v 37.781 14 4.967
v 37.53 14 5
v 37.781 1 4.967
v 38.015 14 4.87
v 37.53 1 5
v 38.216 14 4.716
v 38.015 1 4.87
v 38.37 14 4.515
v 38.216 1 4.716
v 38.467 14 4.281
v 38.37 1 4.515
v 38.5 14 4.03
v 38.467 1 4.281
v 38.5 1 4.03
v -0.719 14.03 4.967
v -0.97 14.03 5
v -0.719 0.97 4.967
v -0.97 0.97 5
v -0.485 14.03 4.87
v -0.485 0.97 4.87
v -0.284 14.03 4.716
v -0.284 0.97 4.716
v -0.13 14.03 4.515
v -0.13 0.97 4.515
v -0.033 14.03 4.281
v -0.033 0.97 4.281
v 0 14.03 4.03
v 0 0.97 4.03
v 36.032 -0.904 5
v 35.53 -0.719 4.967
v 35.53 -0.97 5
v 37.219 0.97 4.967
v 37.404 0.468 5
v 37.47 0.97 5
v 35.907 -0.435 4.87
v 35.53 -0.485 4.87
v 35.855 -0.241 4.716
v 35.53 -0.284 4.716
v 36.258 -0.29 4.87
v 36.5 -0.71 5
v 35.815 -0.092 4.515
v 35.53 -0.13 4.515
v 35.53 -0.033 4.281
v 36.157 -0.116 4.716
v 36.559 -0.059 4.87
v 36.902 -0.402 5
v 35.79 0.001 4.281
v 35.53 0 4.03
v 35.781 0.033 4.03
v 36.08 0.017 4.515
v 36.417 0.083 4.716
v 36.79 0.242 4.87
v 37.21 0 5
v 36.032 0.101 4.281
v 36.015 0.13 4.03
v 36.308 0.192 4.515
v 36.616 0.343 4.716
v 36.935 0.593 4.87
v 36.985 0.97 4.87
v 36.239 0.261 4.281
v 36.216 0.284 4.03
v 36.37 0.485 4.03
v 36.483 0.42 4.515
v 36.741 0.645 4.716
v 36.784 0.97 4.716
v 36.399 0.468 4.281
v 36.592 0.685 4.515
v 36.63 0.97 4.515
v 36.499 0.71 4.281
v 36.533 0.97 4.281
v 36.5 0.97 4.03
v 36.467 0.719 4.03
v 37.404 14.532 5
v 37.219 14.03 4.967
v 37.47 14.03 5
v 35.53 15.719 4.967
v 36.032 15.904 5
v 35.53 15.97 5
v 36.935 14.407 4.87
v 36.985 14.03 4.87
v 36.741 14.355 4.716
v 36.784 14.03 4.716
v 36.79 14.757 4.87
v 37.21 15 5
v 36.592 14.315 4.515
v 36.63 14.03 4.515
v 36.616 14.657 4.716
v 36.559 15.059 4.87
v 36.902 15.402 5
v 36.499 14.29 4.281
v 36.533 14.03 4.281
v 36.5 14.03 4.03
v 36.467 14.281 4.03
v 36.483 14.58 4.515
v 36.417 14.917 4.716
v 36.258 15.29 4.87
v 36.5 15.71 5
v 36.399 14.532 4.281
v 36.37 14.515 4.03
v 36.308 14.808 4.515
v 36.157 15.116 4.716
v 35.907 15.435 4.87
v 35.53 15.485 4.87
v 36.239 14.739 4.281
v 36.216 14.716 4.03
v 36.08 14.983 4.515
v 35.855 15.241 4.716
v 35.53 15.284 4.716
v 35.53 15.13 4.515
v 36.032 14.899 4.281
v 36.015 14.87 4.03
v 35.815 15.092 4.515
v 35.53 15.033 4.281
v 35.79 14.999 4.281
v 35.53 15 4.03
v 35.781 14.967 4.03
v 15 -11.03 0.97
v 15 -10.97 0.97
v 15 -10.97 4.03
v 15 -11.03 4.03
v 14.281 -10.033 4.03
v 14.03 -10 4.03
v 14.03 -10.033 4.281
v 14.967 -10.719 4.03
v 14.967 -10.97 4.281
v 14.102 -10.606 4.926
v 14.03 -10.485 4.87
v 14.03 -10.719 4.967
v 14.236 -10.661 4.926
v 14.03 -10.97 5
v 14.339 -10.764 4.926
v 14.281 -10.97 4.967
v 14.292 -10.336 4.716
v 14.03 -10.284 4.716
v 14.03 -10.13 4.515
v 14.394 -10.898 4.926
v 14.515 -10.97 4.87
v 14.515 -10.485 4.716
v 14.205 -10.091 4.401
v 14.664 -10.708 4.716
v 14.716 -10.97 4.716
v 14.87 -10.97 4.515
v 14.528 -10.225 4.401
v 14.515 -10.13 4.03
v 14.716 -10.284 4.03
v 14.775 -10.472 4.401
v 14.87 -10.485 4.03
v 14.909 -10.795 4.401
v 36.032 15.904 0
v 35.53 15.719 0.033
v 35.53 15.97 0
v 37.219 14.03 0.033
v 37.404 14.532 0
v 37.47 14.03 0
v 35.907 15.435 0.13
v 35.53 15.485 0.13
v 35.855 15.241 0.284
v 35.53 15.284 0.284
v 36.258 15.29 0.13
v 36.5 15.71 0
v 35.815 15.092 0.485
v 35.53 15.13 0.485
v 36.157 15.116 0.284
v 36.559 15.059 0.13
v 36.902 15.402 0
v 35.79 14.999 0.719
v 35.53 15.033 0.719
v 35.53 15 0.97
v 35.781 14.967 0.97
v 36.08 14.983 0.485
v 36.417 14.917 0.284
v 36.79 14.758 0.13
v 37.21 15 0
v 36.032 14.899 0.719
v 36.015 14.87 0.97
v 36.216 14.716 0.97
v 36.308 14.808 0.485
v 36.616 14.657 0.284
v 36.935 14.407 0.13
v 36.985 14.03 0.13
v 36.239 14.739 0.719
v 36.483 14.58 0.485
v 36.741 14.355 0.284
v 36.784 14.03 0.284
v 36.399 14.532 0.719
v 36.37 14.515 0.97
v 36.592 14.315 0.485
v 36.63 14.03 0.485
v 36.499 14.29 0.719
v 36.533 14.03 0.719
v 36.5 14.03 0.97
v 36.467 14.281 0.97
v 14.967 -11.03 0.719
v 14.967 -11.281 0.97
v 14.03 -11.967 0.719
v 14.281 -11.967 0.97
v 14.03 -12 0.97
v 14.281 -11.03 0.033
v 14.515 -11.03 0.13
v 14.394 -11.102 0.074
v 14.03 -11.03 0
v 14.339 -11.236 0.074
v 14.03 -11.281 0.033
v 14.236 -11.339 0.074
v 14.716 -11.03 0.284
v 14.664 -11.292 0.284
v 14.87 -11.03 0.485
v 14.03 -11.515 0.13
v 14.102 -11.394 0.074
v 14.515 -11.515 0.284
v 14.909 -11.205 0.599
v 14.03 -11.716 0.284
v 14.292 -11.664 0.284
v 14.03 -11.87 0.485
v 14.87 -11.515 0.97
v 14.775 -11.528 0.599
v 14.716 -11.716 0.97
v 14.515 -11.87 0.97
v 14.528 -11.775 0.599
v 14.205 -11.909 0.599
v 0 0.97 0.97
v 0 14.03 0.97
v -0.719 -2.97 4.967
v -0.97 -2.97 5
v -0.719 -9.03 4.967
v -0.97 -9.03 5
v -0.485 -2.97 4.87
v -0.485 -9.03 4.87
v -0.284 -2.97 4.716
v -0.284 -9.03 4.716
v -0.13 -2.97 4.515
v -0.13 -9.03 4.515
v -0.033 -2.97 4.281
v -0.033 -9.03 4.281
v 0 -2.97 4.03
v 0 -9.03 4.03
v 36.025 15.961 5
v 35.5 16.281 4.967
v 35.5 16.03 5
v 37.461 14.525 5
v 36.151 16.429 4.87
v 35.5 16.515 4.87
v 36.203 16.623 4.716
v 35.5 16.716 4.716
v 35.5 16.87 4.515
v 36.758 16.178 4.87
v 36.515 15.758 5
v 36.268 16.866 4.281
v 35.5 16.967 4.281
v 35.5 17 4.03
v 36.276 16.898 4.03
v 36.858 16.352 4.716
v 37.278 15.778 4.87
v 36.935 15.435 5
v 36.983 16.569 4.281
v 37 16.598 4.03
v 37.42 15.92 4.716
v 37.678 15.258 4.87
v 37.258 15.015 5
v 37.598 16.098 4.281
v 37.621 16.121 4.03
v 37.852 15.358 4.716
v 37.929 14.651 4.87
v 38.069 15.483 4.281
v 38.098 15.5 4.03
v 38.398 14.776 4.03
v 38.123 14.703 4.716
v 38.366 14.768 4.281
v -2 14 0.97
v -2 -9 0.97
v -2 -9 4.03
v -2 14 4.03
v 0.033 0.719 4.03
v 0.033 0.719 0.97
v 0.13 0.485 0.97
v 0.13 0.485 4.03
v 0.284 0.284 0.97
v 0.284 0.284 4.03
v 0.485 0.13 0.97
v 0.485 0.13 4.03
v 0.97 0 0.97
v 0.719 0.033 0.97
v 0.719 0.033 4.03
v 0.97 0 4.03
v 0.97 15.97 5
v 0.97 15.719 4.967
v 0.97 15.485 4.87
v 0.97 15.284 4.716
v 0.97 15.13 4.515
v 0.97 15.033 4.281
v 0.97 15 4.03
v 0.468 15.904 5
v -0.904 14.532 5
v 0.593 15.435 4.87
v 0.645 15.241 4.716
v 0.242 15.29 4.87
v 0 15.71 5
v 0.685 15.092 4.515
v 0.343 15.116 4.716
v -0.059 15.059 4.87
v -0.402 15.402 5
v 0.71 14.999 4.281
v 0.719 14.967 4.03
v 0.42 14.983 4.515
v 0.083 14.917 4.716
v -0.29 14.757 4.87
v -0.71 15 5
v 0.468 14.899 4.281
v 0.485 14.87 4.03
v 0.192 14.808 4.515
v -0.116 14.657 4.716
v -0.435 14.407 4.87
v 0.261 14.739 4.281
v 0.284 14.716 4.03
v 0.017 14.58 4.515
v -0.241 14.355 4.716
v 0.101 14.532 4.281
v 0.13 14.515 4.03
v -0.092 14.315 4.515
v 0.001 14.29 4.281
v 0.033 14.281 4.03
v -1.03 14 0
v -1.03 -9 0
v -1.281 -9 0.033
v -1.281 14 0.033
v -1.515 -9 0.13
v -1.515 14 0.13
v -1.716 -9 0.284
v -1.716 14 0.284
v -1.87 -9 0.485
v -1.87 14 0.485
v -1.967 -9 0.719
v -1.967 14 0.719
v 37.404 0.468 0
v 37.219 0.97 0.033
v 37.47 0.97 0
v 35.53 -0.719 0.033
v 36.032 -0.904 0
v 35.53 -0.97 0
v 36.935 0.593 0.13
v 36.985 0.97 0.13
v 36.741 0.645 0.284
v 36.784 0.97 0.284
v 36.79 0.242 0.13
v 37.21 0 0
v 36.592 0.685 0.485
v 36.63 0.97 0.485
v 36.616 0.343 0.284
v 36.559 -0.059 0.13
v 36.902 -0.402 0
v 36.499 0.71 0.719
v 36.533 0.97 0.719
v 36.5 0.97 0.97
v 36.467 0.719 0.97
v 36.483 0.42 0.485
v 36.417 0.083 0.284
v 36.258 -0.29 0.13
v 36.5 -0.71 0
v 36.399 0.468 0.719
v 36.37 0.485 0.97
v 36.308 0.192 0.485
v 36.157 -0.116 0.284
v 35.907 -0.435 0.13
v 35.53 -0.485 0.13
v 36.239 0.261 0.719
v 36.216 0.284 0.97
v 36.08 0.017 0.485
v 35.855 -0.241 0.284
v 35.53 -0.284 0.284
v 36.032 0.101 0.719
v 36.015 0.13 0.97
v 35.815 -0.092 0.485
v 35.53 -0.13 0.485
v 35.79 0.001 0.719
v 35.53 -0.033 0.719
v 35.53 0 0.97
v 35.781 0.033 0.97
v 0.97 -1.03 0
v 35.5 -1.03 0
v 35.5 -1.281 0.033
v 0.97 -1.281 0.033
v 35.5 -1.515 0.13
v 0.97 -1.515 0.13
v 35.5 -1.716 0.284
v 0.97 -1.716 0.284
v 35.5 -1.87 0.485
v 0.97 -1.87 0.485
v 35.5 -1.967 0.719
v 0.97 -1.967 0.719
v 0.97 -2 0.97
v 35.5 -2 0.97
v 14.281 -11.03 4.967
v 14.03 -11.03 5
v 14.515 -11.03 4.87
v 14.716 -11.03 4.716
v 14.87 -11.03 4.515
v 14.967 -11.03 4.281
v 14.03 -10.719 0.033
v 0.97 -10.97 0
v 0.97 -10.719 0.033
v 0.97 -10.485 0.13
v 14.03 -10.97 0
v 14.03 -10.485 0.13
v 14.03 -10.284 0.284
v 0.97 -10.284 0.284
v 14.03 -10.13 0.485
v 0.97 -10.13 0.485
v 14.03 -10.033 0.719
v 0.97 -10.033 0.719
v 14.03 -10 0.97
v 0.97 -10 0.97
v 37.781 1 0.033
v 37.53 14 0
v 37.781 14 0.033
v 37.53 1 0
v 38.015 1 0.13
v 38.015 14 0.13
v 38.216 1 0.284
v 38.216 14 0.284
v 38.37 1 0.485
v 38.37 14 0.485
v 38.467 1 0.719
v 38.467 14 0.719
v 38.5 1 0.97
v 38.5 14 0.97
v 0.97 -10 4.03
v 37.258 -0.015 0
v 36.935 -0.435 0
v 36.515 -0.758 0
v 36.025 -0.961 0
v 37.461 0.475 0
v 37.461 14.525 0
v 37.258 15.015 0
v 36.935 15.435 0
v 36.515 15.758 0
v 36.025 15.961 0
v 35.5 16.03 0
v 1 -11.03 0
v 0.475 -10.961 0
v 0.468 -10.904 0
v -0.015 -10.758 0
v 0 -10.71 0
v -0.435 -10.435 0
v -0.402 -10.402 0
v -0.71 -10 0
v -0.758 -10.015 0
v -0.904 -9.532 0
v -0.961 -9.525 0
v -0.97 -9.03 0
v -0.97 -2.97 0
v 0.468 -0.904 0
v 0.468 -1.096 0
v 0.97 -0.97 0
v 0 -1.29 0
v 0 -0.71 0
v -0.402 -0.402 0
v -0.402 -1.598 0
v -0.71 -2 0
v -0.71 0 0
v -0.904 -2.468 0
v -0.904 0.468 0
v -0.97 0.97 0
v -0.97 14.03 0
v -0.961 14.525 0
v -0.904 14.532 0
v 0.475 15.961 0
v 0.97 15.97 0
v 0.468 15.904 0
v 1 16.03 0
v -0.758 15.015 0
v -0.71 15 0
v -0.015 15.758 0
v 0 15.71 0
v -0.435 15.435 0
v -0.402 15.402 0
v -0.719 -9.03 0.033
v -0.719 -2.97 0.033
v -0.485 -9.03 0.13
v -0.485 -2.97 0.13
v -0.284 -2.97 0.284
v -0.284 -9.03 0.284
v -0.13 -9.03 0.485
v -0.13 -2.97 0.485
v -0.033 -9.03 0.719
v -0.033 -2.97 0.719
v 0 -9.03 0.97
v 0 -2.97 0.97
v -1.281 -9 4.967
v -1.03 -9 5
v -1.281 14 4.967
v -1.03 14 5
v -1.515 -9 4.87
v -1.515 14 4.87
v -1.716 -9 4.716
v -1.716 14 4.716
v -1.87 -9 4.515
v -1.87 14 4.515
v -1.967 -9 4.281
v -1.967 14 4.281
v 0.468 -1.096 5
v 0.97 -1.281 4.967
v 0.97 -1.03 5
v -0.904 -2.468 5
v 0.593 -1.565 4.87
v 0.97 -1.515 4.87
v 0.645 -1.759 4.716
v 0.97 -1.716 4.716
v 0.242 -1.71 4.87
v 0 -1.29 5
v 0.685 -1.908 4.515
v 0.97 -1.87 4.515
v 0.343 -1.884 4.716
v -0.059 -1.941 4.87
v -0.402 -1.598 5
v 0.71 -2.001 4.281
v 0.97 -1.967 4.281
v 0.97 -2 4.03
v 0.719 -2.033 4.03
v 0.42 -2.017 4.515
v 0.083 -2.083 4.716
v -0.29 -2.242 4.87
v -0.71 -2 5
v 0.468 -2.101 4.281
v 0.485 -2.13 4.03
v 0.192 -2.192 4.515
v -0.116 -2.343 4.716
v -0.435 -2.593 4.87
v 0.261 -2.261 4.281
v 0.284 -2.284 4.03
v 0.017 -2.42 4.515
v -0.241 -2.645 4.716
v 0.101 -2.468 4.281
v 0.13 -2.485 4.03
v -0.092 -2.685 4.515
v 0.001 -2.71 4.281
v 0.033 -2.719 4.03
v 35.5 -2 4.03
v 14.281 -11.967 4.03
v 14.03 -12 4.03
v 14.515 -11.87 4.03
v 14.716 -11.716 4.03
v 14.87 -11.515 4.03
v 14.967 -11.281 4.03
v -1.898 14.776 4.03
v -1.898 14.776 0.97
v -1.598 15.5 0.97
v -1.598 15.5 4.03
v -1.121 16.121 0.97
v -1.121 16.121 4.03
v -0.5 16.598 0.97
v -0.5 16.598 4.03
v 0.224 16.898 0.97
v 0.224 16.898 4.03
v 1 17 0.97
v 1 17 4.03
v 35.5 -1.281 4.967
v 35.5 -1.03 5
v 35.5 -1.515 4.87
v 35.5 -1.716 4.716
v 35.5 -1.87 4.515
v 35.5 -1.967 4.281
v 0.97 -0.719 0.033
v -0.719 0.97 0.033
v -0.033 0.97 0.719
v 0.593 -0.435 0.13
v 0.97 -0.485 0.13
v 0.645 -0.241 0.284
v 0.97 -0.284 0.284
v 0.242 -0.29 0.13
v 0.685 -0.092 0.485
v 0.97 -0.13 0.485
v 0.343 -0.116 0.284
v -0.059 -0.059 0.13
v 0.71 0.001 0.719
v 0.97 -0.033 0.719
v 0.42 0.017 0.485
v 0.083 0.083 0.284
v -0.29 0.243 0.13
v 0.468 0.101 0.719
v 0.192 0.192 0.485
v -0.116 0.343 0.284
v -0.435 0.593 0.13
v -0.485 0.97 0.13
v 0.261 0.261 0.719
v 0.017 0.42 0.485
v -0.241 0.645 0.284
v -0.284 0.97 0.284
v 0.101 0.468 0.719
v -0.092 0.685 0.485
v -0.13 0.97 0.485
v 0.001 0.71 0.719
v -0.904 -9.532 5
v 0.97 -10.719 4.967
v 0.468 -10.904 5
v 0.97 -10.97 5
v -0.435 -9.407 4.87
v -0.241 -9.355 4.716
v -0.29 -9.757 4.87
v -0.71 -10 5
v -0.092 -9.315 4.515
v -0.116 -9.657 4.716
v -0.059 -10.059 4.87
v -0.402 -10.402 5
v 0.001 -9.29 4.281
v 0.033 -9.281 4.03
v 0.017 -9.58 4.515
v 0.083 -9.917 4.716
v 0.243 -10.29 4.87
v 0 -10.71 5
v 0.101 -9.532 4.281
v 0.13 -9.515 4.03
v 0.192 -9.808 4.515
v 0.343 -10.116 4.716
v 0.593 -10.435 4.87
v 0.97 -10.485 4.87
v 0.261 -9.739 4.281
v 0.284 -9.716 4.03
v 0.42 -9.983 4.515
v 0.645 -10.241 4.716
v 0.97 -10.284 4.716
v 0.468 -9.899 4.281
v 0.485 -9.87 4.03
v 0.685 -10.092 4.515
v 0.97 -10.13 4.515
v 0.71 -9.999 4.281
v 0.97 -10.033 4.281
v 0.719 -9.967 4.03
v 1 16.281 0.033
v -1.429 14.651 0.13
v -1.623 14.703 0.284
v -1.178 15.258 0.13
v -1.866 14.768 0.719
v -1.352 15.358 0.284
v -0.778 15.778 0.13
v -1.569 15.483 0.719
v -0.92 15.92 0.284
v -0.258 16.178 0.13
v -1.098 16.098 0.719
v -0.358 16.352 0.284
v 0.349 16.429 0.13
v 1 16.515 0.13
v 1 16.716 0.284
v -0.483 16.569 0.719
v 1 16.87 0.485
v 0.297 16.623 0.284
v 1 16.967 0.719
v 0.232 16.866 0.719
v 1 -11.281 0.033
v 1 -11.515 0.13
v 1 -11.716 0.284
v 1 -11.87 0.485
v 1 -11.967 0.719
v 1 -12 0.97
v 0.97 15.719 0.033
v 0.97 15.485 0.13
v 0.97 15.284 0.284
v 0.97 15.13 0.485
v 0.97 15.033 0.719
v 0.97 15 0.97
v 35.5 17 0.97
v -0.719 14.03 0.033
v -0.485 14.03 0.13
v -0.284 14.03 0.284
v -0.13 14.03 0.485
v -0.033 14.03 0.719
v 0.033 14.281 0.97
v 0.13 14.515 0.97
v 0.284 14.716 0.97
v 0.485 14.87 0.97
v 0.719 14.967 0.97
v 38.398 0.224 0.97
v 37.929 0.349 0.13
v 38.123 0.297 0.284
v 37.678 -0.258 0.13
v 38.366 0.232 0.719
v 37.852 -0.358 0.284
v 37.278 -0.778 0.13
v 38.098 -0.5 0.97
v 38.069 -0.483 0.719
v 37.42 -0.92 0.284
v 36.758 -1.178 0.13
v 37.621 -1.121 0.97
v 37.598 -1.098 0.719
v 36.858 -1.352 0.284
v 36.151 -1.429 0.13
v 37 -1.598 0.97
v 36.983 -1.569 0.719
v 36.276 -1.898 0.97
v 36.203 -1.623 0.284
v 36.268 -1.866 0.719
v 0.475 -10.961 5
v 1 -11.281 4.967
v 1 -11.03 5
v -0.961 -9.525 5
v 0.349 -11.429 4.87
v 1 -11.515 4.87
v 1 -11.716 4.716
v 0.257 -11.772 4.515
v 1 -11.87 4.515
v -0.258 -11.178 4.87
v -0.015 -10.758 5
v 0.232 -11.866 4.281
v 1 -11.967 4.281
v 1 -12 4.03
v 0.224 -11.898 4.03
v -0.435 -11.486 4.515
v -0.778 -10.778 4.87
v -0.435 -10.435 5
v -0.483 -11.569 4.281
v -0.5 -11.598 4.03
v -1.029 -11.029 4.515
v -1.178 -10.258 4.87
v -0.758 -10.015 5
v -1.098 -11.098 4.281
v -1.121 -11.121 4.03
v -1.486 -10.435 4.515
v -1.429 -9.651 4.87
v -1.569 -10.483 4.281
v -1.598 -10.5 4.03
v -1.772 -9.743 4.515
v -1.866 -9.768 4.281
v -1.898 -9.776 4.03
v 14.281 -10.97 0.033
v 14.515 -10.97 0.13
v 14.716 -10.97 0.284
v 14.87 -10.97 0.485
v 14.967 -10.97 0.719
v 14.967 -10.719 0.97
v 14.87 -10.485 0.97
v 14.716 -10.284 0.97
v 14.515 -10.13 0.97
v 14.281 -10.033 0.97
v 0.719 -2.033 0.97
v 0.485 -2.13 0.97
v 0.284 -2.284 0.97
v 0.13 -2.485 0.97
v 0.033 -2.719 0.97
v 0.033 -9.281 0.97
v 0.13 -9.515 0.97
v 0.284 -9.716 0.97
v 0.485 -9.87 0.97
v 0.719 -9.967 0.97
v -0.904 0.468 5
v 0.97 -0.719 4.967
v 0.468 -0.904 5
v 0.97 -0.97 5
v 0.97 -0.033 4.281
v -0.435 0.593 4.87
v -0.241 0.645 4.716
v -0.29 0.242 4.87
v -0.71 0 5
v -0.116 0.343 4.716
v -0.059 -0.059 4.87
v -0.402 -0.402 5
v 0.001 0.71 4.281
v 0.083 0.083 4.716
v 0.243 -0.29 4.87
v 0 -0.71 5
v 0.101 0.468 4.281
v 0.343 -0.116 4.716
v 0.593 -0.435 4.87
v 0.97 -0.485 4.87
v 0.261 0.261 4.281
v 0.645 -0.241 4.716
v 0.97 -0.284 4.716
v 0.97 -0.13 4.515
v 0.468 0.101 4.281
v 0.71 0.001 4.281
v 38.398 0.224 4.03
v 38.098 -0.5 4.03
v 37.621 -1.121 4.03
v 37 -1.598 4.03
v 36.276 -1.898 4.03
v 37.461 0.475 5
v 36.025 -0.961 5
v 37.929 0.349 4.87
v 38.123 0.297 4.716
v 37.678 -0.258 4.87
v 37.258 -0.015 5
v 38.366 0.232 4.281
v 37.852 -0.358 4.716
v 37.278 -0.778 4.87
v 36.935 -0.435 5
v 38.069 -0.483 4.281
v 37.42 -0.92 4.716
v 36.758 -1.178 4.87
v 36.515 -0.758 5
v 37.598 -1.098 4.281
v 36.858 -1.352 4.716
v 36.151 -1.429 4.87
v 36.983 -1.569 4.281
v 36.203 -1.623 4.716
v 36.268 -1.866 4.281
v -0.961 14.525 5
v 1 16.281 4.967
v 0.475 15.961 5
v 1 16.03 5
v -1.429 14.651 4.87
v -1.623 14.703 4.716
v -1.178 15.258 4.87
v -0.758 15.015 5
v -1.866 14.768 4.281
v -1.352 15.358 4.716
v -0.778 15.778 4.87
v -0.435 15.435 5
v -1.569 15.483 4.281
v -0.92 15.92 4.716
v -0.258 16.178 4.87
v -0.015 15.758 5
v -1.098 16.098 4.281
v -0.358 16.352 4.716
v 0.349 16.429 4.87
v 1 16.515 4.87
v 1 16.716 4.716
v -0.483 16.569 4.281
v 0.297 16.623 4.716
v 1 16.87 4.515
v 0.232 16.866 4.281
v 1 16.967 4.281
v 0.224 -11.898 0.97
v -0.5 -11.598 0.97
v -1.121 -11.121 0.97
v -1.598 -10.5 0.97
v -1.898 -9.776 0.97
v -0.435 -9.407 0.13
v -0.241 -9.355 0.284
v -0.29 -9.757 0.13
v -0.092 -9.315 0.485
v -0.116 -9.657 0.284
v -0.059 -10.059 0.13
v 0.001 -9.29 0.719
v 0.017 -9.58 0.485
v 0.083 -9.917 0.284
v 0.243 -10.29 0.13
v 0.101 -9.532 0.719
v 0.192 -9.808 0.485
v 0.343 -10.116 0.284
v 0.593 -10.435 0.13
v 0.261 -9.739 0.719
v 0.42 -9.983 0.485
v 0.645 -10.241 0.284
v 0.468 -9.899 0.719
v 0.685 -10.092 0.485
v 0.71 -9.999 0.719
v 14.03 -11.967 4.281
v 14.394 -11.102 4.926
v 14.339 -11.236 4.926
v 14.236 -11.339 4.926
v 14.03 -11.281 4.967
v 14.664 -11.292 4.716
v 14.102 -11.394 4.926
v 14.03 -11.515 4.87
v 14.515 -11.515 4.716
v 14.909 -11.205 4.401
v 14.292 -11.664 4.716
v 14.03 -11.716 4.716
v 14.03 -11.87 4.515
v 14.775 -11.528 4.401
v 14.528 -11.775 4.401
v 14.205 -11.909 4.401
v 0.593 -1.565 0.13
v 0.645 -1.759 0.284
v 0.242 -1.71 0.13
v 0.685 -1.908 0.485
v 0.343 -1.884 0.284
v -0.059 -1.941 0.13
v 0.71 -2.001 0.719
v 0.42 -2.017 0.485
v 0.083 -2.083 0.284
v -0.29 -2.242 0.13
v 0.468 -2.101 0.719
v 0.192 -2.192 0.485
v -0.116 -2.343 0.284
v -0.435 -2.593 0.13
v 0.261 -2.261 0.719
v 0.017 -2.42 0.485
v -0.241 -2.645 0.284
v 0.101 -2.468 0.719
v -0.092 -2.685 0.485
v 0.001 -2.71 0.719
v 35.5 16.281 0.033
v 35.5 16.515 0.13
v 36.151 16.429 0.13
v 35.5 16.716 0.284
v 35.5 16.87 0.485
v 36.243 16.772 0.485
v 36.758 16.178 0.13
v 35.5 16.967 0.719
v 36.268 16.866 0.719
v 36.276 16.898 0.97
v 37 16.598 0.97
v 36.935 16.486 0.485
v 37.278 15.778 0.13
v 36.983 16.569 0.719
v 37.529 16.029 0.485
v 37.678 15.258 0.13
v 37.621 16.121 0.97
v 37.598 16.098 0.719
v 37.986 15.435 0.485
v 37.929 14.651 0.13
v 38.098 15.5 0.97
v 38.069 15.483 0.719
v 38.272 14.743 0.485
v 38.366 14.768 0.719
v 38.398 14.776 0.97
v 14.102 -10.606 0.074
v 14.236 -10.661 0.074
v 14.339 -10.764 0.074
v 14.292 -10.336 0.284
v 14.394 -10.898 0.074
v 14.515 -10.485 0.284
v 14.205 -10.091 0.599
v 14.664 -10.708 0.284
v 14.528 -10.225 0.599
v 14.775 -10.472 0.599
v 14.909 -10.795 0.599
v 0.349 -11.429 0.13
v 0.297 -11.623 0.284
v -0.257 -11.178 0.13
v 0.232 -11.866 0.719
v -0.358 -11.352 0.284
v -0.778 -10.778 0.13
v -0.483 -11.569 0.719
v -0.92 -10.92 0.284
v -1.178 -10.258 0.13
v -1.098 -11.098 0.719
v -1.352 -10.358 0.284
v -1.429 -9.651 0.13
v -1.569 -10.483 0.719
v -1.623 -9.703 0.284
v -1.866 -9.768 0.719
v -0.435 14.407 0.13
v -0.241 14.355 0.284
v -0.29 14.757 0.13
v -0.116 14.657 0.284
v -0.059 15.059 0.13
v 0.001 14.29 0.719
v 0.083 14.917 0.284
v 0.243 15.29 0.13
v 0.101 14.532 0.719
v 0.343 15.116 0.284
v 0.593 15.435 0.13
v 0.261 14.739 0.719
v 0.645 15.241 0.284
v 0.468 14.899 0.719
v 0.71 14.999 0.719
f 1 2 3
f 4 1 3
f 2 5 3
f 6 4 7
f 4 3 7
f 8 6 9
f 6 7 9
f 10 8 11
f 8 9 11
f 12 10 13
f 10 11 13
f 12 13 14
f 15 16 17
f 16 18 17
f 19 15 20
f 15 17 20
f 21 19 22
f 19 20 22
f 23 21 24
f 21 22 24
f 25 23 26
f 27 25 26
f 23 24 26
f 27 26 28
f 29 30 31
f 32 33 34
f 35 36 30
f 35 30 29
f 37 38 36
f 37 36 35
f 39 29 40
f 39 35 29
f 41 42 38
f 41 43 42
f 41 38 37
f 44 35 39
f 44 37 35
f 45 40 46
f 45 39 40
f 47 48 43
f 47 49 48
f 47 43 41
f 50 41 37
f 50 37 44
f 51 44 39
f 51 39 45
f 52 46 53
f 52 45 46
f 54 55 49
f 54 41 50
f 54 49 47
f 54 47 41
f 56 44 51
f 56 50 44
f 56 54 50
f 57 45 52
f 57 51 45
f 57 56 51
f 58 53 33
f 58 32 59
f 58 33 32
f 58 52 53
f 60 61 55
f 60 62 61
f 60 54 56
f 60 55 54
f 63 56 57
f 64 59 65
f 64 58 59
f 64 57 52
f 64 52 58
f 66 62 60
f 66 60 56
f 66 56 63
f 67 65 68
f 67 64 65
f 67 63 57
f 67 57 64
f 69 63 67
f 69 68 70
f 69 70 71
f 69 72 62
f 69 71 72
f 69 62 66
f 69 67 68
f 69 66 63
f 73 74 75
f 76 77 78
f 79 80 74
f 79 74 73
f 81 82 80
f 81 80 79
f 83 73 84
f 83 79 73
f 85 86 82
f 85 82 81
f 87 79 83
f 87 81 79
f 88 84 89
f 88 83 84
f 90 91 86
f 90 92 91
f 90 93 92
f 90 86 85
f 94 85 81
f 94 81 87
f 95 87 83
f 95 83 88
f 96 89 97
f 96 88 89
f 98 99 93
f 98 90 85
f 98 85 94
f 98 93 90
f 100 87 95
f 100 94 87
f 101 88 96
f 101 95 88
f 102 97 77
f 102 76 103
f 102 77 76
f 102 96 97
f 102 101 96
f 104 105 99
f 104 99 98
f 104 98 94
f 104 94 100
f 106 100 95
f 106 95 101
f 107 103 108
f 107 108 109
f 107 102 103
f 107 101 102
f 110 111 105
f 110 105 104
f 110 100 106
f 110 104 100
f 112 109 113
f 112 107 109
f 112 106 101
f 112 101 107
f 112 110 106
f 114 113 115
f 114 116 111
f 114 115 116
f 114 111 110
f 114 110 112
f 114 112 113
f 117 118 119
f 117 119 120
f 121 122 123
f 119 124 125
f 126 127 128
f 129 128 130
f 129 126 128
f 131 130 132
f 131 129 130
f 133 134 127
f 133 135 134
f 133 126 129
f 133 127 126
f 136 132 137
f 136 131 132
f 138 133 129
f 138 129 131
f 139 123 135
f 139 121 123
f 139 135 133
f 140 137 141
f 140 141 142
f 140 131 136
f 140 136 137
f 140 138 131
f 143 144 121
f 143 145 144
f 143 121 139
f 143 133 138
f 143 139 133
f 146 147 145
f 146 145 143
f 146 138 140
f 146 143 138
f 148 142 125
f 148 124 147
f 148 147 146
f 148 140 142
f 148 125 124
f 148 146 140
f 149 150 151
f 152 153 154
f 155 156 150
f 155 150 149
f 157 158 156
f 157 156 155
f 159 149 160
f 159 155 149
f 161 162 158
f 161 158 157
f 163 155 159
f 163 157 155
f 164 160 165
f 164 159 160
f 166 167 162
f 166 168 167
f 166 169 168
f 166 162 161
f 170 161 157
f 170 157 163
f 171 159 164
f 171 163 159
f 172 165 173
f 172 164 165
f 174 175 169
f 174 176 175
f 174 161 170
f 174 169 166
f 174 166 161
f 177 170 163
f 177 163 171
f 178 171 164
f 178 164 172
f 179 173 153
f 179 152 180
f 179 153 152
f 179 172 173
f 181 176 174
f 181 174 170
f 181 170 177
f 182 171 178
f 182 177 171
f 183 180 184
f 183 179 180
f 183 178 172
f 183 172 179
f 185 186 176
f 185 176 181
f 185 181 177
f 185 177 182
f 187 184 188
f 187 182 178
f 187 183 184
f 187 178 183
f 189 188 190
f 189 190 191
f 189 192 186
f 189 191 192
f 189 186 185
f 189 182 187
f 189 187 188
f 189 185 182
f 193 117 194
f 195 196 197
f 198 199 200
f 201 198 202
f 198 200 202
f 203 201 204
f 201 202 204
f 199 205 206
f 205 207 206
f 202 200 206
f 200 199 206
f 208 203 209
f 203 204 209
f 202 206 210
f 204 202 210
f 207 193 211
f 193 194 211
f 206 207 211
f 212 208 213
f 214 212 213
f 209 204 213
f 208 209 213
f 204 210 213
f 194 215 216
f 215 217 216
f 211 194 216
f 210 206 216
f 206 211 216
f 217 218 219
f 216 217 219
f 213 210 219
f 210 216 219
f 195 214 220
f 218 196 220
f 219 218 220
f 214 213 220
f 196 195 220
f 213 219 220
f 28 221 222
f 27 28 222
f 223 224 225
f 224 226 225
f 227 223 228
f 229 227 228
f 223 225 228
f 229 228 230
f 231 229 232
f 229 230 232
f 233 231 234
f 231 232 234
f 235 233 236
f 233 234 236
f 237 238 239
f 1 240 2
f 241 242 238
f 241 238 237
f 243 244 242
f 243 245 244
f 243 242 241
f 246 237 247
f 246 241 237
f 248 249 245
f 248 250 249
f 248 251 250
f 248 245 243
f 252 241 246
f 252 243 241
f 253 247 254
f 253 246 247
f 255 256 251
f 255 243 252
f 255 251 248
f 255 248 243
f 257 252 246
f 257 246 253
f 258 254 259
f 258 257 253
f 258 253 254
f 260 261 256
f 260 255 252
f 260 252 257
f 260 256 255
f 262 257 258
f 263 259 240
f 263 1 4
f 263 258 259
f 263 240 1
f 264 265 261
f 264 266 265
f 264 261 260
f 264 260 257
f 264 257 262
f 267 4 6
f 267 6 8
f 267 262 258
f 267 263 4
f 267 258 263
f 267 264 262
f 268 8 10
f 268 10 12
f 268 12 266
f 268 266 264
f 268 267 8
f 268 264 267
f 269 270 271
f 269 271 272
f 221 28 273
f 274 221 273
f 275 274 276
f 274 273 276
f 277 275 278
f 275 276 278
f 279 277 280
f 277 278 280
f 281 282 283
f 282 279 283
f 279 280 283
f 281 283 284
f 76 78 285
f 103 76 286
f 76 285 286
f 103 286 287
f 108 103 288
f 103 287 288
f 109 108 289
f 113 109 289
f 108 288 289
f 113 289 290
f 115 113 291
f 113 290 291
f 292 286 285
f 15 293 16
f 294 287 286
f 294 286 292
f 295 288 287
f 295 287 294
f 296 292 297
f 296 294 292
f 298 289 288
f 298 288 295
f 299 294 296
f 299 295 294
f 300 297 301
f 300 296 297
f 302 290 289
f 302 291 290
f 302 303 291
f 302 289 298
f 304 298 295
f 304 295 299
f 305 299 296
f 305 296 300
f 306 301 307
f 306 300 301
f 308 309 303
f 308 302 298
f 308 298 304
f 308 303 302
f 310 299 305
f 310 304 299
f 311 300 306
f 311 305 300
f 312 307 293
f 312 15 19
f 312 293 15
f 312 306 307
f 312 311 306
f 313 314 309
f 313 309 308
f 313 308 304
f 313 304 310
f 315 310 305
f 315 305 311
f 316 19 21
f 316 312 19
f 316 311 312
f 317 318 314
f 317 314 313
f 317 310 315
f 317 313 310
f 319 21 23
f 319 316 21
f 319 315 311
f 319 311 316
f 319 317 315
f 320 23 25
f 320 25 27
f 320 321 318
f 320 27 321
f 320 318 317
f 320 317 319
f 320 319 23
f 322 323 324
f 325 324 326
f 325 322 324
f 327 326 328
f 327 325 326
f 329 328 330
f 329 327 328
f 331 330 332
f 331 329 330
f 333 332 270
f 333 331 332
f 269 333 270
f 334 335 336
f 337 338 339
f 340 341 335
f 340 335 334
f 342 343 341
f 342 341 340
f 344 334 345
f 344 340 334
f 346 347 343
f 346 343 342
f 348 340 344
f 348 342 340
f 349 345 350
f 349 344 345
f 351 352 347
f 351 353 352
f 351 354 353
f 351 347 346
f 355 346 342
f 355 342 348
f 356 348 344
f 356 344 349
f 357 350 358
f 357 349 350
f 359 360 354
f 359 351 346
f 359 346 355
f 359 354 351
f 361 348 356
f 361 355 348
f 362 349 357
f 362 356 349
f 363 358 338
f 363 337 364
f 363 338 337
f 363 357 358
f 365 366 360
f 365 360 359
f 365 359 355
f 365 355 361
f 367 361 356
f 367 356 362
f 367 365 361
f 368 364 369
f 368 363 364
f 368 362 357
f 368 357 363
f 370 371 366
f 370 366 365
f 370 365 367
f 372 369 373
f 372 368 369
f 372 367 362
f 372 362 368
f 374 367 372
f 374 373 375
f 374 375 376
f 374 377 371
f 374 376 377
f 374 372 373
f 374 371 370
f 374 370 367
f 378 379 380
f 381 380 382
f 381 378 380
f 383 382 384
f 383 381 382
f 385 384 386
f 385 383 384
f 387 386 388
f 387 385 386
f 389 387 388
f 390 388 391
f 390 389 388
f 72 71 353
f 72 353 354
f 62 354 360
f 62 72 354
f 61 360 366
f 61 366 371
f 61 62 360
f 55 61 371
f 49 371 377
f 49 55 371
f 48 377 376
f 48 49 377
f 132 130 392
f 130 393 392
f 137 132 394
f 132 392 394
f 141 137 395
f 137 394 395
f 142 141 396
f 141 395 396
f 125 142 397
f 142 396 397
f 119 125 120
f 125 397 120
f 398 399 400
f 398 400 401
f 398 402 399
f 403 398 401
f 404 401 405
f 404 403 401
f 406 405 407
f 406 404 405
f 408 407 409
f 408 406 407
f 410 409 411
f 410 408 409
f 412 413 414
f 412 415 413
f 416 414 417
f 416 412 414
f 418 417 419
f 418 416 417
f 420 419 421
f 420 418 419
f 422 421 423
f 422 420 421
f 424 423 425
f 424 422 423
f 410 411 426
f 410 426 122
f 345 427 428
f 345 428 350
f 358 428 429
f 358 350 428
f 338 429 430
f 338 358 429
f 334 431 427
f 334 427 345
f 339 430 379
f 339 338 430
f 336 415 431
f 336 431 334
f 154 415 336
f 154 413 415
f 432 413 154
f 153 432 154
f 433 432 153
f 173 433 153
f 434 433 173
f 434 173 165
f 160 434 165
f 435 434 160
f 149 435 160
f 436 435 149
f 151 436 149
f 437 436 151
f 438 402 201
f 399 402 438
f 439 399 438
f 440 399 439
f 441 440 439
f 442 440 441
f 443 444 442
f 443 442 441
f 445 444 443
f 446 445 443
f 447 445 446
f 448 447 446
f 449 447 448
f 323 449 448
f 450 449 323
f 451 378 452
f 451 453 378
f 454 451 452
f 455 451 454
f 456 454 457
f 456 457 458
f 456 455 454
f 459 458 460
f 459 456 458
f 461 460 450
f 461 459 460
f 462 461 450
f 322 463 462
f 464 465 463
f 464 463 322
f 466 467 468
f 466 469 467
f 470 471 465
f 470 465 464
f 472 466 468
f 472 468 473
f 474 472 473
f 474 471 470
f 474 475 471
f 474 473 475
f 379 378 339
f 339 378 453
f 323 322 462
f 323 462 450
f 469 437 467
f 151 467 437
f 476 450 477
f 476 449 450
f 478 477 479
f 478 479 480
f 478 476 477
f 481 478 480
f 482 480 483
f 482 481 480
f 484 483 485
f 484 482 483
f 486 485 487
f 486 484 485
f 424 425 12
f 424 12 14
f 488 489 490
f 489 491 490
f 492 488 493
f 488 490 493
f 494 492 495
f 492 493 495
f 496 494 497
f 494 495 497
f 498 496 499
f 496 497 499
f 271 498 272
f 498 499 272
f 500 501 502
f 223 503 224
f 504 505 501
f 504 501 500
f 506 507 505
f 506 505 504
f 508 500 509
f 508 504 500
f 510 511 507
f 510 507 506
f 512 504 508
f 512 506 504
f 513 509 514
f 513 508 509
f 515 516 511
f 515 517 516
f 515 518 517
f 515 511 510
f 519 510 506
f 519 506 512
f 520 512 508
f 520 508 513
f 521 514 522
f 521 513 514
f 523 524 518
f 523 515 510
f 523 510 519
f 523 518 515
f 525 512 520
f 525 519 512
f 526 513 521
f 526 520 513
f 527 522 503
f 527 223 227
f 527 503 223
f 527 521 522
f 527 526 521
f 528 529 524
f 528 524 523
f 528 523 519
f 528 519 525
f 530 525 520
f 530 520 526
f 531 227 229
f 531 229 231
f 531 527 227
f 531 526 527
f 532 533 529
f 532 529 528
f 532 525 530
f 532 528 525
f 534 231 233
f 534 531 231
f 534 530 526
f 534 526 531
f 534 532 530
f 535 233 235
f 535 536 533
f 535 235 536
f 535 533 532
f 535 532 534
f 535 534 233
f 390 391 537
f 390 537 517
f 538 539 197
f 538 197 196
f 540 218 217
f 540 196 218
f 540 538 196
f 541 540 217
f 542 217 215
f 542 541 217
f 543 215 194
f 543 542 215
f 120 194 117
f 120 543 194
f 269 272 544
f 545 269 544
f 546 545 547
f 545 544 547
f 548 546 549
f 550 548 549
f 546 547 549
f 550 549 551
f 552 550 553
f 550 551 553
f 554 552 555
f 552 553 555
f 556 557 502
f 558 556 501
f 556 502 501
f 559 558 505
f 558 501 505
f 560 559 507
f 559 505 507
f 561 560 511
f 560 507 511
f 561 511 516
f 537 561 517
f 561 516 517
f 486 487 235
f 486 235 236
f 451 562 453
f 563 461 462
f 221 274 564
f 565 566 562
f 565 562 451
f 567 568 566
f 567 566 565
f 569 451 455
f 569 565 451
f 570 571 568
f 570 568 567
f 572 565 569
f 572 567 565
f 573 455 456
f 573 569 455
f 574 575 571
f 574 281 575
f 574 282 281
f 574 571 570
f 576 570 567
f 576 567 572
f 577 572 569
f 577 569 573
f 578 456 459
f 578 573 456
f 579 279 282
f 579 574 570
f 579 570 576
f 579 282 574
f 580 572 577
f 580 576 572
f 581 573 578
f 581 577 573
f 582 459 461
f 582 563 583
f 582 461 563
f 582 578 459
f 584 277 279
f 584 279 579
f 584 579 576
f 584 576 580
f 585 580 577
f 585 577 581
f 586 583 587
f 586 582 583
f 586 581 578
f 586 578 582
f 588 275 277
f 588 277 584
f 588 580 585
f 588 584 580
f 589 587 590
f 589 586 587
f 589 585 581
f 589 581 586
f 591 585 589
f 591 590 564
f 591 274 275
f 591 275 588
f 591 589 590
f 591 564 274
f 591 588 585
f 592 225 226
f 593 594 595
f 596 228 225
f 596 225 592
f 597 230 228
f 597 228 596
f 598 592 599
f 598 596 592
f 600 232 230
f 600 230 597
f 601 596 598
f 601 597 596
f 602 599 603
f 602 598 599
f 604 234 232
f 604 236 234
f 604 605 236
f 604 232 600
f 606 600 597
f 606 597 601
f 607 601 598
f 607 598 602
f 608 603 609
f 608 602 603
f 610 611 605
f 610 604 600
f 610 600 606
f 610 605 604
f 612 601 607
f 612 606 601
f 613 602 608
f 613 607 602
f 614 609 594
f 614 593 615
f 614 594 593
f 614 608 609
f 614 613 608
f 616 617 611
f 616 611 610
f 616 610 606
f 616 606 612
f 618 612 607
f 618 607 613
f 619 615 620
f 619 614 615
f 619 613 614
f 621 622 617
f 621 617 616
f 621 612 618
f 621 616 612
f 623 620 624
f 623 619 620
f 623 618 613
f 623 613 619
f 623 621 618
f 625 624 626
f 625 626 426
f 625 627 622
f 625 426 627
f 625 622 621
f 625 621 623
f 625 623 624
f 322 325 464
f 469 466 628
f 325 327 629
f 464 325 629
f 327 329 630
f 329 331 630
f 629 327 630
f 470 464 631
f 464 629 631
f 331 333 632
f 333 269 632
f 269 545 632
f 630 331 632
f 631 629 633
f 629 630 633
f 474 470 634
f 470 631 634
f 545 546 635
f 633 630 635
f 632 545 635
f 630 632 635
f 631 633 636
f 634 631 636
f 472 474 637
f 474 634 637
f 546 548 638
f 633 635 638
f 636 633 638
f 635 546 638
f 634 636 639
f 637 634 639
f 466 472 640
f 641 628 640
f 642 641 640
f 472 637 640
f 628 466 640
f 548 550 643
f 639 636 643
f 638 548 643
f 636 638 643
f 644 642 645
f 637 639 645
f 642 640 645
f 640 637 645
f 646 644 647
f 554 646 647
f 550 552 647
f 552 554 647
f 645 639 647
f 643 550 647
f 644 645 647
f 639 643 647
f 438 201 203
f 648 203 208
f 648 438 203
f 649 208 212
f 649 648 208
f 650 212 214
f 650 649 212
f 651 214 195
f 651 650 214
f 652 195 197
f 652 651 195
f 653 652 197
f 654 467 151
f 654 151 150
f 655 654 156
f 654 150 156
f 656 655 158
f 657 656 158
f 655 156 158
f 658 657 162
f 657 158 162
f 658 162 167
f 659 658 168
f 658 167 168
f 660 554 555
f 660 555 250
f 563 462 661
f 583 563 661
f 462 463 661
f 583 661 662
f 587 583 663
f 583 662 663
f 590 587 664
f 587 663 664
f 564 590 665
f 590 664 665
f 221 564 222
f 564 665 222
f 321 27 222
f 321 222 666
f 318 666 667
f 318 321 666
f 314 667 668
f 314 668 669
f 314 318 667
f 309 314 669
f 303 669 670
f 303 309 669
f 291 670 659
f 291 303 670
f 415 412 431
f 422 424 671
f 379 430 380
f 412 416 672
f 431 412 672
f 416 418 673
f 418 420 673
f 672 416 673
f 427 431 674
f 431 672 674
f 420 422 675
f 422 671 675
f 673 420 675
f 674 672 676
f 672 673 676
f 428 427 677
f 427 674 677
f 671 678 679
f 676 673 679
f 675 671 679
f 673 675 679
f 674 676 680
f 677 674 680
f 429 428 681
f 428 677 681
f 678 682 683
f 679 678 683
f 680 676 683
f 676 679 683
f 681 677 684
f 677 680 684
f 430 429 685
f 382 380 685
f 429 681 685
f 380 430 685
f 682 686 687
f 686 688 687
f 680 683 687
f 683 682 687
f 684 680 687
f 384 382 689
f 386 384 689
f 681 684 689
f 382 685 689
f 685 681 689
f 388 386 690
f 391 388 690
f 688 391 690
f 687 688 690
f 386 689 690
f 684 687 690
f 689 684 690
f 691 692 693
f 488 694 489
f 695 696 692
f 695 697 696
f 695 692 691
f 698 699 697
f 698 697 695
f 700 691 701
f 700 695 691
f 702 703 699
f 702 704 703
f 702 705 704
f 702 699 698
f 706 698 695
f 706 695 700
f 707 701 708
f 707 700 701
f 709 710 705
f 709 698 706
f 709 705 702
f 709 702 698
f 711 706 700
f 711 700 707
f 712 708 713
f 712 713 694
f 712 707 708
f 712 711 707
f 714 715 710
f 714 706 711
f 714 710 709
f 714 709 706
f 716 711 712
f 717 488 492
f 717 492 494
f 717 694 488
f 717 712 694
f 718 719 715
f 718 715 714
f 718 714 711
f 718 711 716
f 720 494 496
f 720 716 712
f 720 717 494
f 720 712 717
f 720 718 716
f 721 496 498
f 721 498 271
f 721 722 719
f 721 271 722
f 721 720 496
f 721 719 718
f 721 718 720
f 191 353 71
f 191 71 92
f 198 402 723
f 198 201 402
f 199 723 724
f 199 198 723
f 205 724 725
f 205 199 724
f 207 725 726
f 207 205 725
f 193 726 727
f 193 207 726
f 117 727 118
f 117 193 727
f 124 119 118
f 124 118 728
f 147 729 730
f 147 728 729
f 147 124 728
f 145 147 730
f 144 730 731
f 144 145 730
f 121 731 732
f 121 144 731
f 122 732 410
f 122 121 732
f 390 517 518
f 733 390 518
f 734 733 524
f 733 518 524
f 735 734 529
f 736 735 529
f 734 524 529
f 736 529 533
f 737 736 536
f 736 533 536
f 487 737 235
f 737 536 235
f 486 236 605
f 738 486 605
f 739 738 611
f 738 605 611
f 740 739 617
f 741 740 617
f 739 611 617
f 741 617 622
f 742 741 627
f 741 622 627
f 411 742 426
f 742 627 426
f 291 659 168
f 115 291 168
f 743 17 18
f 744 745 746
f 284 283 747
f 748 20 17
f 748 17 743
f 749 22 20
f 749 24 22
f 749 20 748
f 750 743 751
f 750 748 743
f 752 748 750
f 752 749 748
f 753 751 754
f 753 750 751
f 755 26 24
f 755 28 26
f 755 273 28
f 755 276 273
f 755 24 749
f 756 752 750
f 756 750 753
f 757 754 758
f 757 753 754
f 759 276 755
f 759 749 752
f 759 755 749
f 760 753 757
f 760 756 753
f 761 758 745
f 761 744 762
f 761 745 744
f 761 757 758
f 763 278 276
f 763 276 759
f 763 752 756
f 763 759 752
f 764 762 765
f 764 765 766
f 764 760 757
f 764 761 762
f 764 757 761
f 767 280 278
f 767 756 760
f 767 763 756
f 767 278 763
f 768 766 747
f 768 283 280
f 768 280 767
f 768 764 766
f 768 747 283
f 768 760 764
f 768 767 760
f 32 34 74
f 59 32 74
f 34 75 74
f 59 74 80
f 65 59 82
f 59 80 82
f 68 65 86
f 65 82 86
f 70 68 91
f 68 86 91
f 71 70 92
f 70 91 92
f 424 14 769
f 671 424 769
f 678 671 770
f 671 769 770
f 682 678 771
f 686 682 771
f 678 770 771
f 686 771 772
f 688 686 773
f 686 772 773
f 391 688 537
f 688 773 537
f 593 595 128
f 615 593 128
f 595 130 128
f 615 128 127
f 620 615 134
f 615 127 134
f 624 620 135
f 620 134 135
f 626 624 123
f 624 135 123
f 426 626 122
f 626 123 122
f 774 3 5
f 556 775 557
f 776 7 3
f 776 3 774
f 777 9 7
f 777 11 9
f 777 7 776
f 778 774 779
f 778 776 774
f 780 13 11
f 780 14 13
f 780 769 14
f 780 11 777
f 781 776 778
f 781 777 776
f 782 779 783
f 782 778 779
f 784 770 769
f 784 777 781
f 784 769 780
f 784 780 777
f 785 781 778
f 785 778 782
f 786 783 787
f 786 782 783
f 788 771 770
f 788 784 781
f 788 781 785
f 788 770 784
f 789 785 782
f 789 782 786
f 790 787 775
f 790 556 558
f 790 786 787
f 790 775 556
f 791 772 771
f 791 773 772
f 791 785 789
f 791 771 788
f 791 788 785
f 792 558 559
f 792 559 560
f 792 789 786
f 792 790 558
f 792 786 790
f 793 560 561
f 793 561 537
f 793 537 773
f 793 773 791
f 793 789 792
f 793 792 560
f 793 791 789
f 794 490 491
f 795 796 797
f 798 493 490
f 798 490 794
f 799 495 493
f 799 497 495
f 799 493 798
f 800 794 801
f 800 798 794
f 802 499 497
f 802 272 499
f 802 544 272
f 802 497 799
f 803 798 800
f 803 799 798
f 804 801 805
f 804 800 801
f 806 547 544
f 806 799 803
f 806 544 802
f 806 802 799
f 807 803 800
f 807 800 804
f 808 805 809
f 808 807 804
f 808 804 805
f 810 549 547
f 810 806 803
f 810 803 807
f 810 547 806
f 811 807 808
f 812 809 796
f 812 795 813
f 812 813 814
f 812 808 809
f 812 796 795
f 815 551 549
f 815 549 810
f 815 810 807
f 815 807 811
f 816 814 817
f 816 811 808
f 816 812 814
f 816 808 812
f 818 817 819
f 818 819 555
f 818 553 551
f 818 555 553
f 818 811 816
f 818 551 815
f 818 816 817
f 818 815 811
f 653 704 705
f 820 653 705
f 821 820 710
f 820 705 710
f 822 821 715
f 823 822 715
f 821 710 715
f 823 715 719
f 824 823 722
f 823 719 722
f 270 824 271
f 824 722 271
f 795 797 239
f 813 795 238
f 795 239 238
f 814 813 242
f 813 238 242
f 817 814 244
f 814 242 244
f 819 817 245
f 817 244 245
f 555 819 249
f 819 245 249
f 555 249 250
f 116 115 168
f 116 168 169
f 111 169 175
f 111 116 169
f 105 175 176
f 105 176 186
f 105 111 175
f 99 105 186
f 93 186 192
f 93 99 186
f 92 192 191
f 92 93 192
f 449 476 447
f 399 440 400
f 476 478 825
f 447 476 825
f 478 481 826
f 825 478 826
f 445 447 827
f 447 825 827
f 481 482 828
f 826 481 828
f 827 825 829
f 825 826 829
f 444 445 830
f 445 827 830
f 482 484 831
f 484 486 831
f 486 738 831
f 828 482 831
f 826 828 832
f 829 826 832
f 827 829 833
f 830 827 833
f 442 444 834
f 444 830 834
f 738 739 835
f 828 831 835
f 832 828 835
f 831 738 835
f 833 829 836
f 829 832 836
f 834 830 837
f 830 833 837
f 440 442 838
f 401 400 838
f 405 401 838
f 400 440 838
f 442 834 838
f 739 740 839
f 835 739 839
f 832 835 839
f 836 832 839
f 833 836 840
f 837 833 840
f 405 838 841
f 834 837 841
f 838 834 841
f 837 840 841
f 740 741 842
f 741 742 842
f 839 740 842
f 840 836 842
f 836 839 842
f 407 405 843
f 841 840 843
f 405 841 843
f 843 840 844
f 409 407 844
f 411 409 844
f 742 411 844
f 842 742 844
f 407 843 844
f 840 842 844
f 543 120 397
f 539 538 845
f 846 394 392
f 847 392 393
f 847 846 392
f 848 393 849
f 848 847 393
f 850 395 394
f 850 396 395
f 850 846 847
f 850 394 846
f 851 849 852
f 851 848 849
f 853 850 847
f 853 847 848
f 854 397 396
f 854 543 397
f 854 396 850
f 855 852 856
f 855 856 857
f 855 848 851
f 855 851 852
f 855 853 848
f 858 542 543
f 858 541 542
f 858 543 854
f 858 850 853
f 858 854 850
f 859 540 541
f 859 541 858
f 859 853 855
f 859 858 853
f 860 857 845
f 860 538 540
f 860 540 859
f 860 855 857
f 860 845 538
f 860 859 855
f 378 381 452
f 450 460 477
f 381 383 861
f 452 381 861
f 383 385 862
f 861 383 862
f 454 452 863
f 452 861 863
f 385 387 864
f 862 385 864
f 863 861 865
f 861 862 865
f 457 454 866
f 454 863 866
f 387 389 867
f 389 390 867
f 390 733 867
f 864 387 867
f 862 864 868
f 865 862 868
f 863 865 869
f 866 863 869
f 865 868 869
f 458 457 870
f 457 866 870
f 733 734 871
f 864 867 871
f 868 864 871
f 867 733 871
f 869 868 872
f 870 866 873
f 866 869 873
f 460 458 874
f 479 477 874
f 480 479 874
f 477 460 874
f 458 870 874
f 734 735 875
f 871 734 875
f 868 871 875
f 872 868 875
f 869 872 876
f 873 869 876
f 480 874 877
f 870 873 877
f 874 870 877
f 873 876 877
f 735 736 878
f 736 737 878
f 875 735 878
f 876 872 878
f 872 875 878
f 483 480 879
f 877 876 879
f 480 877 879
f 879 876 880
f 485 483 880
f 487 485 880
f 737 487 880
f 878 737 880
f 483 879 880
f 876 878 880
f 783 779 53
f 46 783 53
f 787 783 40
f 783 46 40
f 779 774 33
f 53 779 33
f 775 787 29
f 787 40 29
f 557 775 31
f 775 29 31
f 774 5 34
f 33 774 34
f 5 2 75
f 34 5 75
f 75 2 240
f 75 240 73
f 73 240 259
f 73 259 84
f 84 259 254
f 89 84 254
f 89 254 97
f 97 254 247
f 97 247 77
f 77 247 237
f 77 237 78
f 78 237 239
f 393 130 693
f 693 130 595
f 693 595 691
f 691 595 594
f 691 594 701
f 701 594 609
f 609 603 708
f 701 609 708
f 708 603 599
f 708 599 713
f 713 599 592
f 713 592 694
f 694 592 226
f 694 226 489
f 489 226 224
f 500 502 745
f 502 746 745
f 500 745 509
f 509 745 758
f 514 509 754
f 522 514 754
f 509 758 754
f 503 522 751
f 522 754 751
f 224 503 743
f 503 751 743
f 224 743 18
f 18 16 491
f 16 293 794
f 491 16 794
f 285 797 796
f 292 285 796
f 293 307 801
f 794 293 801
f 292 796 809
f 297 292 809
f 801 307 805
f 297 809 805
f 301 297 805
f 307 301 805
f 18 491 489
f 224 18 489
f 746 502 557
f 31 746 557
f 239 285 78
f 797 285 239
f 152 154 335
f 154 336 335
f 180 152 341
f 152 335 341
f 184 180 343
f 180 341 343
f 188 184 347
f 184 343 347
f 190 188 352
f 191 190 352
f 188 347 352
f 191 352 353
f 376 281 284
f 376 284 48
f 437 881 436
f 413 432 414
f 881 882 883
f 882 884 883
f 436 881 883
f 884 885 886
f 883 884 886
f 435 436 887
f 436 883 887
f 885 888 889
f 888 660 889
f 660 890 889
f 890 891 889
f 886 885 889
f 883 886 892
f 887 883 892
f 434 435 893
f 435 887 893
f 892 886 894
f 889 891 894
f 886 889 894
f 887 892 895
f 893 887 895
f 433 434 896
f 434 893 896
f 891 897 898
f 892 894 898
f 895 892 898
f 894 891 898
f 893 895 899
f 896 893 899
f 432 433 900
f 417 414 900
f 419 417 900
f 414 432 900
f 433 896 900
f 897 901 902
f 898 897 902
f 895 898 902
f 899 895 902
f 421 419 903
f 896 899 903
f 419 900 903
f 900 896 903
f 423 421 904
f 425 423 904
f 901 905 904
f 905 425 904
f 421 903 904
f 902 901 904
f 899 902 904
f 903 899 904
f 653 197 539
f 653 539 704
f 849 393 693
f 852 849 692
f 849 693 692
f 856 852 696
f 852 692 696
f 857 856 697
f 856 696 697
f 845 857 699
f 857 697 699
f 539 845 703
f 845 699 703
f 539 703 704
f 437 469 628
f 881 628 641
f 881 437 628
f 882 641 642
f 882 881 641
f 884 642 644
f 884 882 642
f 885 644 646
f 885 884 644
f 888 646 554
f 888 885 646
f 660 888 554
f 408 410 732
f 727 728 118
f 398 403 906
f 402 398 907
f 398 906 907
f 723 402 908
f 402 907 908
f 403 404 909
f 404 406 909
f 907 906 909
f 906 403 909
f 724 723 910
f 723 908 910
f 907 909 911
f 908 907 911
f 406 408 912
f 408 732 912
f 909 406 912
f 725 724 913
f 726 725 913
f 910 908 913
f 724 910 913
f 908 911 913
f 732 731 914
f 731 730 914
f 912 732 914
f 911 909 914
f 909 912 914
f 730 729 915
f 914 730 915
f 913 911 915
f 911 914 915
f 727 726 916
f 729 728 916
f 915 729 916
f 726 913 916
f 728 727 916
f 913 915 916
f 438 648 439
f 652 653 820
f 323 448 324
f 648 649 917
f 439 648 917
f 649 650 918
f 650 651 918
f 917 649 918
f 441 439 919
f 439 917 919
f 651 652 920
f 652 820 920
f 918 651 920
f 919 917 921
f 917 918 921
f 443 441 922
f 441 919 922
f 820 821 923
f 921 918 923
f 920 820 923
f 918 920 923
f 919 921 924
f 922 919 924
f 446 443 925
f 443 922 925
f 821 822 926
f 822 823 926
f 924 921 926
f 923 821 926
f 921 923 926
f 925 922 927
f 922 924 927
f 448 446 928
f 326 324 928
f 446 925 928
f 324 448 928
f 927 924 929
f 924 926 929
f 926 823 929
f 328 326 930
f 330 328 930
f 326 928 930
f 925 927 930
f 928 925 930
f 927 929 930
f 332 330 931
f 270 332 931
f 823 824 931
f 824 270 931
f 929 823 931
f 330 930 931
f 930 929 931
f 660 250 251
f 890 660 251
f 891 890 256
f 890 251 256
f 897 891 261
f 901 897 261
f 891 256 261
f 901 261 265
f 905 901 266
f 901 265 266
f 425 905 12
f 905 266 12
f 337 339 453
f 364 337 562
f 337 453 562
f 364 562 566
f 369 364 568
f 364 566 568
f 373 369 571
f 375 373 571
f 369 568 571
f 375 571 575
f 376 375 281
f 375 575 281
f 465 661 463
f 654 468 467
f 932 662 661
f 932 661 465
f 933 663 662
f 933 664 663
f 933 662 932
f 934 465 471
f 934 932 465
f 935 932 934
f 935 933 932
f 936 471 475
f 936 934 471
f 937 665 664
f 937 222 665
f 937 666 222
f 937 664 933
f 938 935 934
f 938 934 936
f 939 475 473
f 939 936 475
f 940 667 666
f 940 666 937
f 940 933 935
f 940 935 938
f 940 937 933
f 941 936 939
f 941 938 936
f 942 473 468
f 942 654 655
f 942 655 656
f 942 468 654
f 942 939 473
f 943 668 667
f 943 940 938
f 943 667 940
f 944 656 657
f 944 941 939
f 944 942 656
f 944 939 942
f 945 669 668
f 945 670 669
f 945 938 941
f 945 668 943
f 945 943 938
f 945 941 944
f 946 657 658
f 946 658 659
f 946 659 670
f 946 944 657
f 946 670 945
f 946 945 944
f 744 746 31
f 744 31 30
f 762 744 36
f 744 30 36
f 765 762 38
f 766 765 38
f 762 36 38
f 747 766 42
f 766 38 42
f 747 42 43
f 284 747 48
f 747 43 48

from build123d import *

# Parameters (mm, degrees)
SKETCH_W    = 36.5
SKETCH_H    = 15
PAD_DEPTH   = 5
FILLET_R    = 0.97
FILLET001_R = 3
FILLET002_R = 0.97


with BuildPart() as part:
    # Sketch → Pad (new body)
    with BuildSketch(Plane.XY):
        Polygon((-2, 17), (38.5, 17), (38.5, -2), (0, -2), (0, -10), (15, -10), (15, -12), (-2, -12), align=None)
        with Locations((18.25, 7.5)):
            Rectangle(SKETCH_W, SKETCH_H, mode=Mode.SUBTRACT)
    extrude(amount=PAD_DEPTH)

    # Fillet
    fillet_edges = [part.edges().sort_by_distance(p)[0] for p in [
        (0, 15, 2.5),
        (36.5, 15, 2.5),
        (0, 0, 2.5),
        (36.5, 0, 2.5),
        (0, -2, 2.5),
        (0, -10, 2.5),
        (15, -10, 2.5),
        (15, -12, 2.5),
    ]]
    fillet(fillet_edges, radius=FILLET_R)

    # Fillet001
    fillet001_edges = [part.edges().sort_by_distance(p)[0] for p in [
        (-2, -12, 2.5),
        (38.5, -2, 2.5),
        (38.5, 17, 2.5),
        (-2, 17, 2.5),
    ]]
    fillet(fillet001_edges, radius=FILLET001_R)

    # Fillet002
    fillet002_edges = [part.edges().sort_by_distance(p)[0] for p in [
        (18.25, 0, 5),
        (0.284106, 0.284106, 5),
        (0, 7.5, 5),
        (0.284106, 14.715894, 5),
        (18.25, 15, 5),
        (36.215894, 14.715894, 5),
        (36.5, 7.5, 5),
        (36.215894, 0.284106, 5),
        (18.25, 15, 0),
        (0.284106, 14.715894, 0),
        (36.215894, 14.715894, 0),
        (36.5, 7.5, 0),
        (0, 7.5, 0),
        (0.284106, 0.284106, 0),
        (18.25, 0, 0),
        (36.215894, 0.284106, 0),
        (38.5, 7.5, 0),
        (-2, 2.5, 5),
    ]]
    fillet(fillet002_edges, radius=FILLET002_R)


solid = part.part
